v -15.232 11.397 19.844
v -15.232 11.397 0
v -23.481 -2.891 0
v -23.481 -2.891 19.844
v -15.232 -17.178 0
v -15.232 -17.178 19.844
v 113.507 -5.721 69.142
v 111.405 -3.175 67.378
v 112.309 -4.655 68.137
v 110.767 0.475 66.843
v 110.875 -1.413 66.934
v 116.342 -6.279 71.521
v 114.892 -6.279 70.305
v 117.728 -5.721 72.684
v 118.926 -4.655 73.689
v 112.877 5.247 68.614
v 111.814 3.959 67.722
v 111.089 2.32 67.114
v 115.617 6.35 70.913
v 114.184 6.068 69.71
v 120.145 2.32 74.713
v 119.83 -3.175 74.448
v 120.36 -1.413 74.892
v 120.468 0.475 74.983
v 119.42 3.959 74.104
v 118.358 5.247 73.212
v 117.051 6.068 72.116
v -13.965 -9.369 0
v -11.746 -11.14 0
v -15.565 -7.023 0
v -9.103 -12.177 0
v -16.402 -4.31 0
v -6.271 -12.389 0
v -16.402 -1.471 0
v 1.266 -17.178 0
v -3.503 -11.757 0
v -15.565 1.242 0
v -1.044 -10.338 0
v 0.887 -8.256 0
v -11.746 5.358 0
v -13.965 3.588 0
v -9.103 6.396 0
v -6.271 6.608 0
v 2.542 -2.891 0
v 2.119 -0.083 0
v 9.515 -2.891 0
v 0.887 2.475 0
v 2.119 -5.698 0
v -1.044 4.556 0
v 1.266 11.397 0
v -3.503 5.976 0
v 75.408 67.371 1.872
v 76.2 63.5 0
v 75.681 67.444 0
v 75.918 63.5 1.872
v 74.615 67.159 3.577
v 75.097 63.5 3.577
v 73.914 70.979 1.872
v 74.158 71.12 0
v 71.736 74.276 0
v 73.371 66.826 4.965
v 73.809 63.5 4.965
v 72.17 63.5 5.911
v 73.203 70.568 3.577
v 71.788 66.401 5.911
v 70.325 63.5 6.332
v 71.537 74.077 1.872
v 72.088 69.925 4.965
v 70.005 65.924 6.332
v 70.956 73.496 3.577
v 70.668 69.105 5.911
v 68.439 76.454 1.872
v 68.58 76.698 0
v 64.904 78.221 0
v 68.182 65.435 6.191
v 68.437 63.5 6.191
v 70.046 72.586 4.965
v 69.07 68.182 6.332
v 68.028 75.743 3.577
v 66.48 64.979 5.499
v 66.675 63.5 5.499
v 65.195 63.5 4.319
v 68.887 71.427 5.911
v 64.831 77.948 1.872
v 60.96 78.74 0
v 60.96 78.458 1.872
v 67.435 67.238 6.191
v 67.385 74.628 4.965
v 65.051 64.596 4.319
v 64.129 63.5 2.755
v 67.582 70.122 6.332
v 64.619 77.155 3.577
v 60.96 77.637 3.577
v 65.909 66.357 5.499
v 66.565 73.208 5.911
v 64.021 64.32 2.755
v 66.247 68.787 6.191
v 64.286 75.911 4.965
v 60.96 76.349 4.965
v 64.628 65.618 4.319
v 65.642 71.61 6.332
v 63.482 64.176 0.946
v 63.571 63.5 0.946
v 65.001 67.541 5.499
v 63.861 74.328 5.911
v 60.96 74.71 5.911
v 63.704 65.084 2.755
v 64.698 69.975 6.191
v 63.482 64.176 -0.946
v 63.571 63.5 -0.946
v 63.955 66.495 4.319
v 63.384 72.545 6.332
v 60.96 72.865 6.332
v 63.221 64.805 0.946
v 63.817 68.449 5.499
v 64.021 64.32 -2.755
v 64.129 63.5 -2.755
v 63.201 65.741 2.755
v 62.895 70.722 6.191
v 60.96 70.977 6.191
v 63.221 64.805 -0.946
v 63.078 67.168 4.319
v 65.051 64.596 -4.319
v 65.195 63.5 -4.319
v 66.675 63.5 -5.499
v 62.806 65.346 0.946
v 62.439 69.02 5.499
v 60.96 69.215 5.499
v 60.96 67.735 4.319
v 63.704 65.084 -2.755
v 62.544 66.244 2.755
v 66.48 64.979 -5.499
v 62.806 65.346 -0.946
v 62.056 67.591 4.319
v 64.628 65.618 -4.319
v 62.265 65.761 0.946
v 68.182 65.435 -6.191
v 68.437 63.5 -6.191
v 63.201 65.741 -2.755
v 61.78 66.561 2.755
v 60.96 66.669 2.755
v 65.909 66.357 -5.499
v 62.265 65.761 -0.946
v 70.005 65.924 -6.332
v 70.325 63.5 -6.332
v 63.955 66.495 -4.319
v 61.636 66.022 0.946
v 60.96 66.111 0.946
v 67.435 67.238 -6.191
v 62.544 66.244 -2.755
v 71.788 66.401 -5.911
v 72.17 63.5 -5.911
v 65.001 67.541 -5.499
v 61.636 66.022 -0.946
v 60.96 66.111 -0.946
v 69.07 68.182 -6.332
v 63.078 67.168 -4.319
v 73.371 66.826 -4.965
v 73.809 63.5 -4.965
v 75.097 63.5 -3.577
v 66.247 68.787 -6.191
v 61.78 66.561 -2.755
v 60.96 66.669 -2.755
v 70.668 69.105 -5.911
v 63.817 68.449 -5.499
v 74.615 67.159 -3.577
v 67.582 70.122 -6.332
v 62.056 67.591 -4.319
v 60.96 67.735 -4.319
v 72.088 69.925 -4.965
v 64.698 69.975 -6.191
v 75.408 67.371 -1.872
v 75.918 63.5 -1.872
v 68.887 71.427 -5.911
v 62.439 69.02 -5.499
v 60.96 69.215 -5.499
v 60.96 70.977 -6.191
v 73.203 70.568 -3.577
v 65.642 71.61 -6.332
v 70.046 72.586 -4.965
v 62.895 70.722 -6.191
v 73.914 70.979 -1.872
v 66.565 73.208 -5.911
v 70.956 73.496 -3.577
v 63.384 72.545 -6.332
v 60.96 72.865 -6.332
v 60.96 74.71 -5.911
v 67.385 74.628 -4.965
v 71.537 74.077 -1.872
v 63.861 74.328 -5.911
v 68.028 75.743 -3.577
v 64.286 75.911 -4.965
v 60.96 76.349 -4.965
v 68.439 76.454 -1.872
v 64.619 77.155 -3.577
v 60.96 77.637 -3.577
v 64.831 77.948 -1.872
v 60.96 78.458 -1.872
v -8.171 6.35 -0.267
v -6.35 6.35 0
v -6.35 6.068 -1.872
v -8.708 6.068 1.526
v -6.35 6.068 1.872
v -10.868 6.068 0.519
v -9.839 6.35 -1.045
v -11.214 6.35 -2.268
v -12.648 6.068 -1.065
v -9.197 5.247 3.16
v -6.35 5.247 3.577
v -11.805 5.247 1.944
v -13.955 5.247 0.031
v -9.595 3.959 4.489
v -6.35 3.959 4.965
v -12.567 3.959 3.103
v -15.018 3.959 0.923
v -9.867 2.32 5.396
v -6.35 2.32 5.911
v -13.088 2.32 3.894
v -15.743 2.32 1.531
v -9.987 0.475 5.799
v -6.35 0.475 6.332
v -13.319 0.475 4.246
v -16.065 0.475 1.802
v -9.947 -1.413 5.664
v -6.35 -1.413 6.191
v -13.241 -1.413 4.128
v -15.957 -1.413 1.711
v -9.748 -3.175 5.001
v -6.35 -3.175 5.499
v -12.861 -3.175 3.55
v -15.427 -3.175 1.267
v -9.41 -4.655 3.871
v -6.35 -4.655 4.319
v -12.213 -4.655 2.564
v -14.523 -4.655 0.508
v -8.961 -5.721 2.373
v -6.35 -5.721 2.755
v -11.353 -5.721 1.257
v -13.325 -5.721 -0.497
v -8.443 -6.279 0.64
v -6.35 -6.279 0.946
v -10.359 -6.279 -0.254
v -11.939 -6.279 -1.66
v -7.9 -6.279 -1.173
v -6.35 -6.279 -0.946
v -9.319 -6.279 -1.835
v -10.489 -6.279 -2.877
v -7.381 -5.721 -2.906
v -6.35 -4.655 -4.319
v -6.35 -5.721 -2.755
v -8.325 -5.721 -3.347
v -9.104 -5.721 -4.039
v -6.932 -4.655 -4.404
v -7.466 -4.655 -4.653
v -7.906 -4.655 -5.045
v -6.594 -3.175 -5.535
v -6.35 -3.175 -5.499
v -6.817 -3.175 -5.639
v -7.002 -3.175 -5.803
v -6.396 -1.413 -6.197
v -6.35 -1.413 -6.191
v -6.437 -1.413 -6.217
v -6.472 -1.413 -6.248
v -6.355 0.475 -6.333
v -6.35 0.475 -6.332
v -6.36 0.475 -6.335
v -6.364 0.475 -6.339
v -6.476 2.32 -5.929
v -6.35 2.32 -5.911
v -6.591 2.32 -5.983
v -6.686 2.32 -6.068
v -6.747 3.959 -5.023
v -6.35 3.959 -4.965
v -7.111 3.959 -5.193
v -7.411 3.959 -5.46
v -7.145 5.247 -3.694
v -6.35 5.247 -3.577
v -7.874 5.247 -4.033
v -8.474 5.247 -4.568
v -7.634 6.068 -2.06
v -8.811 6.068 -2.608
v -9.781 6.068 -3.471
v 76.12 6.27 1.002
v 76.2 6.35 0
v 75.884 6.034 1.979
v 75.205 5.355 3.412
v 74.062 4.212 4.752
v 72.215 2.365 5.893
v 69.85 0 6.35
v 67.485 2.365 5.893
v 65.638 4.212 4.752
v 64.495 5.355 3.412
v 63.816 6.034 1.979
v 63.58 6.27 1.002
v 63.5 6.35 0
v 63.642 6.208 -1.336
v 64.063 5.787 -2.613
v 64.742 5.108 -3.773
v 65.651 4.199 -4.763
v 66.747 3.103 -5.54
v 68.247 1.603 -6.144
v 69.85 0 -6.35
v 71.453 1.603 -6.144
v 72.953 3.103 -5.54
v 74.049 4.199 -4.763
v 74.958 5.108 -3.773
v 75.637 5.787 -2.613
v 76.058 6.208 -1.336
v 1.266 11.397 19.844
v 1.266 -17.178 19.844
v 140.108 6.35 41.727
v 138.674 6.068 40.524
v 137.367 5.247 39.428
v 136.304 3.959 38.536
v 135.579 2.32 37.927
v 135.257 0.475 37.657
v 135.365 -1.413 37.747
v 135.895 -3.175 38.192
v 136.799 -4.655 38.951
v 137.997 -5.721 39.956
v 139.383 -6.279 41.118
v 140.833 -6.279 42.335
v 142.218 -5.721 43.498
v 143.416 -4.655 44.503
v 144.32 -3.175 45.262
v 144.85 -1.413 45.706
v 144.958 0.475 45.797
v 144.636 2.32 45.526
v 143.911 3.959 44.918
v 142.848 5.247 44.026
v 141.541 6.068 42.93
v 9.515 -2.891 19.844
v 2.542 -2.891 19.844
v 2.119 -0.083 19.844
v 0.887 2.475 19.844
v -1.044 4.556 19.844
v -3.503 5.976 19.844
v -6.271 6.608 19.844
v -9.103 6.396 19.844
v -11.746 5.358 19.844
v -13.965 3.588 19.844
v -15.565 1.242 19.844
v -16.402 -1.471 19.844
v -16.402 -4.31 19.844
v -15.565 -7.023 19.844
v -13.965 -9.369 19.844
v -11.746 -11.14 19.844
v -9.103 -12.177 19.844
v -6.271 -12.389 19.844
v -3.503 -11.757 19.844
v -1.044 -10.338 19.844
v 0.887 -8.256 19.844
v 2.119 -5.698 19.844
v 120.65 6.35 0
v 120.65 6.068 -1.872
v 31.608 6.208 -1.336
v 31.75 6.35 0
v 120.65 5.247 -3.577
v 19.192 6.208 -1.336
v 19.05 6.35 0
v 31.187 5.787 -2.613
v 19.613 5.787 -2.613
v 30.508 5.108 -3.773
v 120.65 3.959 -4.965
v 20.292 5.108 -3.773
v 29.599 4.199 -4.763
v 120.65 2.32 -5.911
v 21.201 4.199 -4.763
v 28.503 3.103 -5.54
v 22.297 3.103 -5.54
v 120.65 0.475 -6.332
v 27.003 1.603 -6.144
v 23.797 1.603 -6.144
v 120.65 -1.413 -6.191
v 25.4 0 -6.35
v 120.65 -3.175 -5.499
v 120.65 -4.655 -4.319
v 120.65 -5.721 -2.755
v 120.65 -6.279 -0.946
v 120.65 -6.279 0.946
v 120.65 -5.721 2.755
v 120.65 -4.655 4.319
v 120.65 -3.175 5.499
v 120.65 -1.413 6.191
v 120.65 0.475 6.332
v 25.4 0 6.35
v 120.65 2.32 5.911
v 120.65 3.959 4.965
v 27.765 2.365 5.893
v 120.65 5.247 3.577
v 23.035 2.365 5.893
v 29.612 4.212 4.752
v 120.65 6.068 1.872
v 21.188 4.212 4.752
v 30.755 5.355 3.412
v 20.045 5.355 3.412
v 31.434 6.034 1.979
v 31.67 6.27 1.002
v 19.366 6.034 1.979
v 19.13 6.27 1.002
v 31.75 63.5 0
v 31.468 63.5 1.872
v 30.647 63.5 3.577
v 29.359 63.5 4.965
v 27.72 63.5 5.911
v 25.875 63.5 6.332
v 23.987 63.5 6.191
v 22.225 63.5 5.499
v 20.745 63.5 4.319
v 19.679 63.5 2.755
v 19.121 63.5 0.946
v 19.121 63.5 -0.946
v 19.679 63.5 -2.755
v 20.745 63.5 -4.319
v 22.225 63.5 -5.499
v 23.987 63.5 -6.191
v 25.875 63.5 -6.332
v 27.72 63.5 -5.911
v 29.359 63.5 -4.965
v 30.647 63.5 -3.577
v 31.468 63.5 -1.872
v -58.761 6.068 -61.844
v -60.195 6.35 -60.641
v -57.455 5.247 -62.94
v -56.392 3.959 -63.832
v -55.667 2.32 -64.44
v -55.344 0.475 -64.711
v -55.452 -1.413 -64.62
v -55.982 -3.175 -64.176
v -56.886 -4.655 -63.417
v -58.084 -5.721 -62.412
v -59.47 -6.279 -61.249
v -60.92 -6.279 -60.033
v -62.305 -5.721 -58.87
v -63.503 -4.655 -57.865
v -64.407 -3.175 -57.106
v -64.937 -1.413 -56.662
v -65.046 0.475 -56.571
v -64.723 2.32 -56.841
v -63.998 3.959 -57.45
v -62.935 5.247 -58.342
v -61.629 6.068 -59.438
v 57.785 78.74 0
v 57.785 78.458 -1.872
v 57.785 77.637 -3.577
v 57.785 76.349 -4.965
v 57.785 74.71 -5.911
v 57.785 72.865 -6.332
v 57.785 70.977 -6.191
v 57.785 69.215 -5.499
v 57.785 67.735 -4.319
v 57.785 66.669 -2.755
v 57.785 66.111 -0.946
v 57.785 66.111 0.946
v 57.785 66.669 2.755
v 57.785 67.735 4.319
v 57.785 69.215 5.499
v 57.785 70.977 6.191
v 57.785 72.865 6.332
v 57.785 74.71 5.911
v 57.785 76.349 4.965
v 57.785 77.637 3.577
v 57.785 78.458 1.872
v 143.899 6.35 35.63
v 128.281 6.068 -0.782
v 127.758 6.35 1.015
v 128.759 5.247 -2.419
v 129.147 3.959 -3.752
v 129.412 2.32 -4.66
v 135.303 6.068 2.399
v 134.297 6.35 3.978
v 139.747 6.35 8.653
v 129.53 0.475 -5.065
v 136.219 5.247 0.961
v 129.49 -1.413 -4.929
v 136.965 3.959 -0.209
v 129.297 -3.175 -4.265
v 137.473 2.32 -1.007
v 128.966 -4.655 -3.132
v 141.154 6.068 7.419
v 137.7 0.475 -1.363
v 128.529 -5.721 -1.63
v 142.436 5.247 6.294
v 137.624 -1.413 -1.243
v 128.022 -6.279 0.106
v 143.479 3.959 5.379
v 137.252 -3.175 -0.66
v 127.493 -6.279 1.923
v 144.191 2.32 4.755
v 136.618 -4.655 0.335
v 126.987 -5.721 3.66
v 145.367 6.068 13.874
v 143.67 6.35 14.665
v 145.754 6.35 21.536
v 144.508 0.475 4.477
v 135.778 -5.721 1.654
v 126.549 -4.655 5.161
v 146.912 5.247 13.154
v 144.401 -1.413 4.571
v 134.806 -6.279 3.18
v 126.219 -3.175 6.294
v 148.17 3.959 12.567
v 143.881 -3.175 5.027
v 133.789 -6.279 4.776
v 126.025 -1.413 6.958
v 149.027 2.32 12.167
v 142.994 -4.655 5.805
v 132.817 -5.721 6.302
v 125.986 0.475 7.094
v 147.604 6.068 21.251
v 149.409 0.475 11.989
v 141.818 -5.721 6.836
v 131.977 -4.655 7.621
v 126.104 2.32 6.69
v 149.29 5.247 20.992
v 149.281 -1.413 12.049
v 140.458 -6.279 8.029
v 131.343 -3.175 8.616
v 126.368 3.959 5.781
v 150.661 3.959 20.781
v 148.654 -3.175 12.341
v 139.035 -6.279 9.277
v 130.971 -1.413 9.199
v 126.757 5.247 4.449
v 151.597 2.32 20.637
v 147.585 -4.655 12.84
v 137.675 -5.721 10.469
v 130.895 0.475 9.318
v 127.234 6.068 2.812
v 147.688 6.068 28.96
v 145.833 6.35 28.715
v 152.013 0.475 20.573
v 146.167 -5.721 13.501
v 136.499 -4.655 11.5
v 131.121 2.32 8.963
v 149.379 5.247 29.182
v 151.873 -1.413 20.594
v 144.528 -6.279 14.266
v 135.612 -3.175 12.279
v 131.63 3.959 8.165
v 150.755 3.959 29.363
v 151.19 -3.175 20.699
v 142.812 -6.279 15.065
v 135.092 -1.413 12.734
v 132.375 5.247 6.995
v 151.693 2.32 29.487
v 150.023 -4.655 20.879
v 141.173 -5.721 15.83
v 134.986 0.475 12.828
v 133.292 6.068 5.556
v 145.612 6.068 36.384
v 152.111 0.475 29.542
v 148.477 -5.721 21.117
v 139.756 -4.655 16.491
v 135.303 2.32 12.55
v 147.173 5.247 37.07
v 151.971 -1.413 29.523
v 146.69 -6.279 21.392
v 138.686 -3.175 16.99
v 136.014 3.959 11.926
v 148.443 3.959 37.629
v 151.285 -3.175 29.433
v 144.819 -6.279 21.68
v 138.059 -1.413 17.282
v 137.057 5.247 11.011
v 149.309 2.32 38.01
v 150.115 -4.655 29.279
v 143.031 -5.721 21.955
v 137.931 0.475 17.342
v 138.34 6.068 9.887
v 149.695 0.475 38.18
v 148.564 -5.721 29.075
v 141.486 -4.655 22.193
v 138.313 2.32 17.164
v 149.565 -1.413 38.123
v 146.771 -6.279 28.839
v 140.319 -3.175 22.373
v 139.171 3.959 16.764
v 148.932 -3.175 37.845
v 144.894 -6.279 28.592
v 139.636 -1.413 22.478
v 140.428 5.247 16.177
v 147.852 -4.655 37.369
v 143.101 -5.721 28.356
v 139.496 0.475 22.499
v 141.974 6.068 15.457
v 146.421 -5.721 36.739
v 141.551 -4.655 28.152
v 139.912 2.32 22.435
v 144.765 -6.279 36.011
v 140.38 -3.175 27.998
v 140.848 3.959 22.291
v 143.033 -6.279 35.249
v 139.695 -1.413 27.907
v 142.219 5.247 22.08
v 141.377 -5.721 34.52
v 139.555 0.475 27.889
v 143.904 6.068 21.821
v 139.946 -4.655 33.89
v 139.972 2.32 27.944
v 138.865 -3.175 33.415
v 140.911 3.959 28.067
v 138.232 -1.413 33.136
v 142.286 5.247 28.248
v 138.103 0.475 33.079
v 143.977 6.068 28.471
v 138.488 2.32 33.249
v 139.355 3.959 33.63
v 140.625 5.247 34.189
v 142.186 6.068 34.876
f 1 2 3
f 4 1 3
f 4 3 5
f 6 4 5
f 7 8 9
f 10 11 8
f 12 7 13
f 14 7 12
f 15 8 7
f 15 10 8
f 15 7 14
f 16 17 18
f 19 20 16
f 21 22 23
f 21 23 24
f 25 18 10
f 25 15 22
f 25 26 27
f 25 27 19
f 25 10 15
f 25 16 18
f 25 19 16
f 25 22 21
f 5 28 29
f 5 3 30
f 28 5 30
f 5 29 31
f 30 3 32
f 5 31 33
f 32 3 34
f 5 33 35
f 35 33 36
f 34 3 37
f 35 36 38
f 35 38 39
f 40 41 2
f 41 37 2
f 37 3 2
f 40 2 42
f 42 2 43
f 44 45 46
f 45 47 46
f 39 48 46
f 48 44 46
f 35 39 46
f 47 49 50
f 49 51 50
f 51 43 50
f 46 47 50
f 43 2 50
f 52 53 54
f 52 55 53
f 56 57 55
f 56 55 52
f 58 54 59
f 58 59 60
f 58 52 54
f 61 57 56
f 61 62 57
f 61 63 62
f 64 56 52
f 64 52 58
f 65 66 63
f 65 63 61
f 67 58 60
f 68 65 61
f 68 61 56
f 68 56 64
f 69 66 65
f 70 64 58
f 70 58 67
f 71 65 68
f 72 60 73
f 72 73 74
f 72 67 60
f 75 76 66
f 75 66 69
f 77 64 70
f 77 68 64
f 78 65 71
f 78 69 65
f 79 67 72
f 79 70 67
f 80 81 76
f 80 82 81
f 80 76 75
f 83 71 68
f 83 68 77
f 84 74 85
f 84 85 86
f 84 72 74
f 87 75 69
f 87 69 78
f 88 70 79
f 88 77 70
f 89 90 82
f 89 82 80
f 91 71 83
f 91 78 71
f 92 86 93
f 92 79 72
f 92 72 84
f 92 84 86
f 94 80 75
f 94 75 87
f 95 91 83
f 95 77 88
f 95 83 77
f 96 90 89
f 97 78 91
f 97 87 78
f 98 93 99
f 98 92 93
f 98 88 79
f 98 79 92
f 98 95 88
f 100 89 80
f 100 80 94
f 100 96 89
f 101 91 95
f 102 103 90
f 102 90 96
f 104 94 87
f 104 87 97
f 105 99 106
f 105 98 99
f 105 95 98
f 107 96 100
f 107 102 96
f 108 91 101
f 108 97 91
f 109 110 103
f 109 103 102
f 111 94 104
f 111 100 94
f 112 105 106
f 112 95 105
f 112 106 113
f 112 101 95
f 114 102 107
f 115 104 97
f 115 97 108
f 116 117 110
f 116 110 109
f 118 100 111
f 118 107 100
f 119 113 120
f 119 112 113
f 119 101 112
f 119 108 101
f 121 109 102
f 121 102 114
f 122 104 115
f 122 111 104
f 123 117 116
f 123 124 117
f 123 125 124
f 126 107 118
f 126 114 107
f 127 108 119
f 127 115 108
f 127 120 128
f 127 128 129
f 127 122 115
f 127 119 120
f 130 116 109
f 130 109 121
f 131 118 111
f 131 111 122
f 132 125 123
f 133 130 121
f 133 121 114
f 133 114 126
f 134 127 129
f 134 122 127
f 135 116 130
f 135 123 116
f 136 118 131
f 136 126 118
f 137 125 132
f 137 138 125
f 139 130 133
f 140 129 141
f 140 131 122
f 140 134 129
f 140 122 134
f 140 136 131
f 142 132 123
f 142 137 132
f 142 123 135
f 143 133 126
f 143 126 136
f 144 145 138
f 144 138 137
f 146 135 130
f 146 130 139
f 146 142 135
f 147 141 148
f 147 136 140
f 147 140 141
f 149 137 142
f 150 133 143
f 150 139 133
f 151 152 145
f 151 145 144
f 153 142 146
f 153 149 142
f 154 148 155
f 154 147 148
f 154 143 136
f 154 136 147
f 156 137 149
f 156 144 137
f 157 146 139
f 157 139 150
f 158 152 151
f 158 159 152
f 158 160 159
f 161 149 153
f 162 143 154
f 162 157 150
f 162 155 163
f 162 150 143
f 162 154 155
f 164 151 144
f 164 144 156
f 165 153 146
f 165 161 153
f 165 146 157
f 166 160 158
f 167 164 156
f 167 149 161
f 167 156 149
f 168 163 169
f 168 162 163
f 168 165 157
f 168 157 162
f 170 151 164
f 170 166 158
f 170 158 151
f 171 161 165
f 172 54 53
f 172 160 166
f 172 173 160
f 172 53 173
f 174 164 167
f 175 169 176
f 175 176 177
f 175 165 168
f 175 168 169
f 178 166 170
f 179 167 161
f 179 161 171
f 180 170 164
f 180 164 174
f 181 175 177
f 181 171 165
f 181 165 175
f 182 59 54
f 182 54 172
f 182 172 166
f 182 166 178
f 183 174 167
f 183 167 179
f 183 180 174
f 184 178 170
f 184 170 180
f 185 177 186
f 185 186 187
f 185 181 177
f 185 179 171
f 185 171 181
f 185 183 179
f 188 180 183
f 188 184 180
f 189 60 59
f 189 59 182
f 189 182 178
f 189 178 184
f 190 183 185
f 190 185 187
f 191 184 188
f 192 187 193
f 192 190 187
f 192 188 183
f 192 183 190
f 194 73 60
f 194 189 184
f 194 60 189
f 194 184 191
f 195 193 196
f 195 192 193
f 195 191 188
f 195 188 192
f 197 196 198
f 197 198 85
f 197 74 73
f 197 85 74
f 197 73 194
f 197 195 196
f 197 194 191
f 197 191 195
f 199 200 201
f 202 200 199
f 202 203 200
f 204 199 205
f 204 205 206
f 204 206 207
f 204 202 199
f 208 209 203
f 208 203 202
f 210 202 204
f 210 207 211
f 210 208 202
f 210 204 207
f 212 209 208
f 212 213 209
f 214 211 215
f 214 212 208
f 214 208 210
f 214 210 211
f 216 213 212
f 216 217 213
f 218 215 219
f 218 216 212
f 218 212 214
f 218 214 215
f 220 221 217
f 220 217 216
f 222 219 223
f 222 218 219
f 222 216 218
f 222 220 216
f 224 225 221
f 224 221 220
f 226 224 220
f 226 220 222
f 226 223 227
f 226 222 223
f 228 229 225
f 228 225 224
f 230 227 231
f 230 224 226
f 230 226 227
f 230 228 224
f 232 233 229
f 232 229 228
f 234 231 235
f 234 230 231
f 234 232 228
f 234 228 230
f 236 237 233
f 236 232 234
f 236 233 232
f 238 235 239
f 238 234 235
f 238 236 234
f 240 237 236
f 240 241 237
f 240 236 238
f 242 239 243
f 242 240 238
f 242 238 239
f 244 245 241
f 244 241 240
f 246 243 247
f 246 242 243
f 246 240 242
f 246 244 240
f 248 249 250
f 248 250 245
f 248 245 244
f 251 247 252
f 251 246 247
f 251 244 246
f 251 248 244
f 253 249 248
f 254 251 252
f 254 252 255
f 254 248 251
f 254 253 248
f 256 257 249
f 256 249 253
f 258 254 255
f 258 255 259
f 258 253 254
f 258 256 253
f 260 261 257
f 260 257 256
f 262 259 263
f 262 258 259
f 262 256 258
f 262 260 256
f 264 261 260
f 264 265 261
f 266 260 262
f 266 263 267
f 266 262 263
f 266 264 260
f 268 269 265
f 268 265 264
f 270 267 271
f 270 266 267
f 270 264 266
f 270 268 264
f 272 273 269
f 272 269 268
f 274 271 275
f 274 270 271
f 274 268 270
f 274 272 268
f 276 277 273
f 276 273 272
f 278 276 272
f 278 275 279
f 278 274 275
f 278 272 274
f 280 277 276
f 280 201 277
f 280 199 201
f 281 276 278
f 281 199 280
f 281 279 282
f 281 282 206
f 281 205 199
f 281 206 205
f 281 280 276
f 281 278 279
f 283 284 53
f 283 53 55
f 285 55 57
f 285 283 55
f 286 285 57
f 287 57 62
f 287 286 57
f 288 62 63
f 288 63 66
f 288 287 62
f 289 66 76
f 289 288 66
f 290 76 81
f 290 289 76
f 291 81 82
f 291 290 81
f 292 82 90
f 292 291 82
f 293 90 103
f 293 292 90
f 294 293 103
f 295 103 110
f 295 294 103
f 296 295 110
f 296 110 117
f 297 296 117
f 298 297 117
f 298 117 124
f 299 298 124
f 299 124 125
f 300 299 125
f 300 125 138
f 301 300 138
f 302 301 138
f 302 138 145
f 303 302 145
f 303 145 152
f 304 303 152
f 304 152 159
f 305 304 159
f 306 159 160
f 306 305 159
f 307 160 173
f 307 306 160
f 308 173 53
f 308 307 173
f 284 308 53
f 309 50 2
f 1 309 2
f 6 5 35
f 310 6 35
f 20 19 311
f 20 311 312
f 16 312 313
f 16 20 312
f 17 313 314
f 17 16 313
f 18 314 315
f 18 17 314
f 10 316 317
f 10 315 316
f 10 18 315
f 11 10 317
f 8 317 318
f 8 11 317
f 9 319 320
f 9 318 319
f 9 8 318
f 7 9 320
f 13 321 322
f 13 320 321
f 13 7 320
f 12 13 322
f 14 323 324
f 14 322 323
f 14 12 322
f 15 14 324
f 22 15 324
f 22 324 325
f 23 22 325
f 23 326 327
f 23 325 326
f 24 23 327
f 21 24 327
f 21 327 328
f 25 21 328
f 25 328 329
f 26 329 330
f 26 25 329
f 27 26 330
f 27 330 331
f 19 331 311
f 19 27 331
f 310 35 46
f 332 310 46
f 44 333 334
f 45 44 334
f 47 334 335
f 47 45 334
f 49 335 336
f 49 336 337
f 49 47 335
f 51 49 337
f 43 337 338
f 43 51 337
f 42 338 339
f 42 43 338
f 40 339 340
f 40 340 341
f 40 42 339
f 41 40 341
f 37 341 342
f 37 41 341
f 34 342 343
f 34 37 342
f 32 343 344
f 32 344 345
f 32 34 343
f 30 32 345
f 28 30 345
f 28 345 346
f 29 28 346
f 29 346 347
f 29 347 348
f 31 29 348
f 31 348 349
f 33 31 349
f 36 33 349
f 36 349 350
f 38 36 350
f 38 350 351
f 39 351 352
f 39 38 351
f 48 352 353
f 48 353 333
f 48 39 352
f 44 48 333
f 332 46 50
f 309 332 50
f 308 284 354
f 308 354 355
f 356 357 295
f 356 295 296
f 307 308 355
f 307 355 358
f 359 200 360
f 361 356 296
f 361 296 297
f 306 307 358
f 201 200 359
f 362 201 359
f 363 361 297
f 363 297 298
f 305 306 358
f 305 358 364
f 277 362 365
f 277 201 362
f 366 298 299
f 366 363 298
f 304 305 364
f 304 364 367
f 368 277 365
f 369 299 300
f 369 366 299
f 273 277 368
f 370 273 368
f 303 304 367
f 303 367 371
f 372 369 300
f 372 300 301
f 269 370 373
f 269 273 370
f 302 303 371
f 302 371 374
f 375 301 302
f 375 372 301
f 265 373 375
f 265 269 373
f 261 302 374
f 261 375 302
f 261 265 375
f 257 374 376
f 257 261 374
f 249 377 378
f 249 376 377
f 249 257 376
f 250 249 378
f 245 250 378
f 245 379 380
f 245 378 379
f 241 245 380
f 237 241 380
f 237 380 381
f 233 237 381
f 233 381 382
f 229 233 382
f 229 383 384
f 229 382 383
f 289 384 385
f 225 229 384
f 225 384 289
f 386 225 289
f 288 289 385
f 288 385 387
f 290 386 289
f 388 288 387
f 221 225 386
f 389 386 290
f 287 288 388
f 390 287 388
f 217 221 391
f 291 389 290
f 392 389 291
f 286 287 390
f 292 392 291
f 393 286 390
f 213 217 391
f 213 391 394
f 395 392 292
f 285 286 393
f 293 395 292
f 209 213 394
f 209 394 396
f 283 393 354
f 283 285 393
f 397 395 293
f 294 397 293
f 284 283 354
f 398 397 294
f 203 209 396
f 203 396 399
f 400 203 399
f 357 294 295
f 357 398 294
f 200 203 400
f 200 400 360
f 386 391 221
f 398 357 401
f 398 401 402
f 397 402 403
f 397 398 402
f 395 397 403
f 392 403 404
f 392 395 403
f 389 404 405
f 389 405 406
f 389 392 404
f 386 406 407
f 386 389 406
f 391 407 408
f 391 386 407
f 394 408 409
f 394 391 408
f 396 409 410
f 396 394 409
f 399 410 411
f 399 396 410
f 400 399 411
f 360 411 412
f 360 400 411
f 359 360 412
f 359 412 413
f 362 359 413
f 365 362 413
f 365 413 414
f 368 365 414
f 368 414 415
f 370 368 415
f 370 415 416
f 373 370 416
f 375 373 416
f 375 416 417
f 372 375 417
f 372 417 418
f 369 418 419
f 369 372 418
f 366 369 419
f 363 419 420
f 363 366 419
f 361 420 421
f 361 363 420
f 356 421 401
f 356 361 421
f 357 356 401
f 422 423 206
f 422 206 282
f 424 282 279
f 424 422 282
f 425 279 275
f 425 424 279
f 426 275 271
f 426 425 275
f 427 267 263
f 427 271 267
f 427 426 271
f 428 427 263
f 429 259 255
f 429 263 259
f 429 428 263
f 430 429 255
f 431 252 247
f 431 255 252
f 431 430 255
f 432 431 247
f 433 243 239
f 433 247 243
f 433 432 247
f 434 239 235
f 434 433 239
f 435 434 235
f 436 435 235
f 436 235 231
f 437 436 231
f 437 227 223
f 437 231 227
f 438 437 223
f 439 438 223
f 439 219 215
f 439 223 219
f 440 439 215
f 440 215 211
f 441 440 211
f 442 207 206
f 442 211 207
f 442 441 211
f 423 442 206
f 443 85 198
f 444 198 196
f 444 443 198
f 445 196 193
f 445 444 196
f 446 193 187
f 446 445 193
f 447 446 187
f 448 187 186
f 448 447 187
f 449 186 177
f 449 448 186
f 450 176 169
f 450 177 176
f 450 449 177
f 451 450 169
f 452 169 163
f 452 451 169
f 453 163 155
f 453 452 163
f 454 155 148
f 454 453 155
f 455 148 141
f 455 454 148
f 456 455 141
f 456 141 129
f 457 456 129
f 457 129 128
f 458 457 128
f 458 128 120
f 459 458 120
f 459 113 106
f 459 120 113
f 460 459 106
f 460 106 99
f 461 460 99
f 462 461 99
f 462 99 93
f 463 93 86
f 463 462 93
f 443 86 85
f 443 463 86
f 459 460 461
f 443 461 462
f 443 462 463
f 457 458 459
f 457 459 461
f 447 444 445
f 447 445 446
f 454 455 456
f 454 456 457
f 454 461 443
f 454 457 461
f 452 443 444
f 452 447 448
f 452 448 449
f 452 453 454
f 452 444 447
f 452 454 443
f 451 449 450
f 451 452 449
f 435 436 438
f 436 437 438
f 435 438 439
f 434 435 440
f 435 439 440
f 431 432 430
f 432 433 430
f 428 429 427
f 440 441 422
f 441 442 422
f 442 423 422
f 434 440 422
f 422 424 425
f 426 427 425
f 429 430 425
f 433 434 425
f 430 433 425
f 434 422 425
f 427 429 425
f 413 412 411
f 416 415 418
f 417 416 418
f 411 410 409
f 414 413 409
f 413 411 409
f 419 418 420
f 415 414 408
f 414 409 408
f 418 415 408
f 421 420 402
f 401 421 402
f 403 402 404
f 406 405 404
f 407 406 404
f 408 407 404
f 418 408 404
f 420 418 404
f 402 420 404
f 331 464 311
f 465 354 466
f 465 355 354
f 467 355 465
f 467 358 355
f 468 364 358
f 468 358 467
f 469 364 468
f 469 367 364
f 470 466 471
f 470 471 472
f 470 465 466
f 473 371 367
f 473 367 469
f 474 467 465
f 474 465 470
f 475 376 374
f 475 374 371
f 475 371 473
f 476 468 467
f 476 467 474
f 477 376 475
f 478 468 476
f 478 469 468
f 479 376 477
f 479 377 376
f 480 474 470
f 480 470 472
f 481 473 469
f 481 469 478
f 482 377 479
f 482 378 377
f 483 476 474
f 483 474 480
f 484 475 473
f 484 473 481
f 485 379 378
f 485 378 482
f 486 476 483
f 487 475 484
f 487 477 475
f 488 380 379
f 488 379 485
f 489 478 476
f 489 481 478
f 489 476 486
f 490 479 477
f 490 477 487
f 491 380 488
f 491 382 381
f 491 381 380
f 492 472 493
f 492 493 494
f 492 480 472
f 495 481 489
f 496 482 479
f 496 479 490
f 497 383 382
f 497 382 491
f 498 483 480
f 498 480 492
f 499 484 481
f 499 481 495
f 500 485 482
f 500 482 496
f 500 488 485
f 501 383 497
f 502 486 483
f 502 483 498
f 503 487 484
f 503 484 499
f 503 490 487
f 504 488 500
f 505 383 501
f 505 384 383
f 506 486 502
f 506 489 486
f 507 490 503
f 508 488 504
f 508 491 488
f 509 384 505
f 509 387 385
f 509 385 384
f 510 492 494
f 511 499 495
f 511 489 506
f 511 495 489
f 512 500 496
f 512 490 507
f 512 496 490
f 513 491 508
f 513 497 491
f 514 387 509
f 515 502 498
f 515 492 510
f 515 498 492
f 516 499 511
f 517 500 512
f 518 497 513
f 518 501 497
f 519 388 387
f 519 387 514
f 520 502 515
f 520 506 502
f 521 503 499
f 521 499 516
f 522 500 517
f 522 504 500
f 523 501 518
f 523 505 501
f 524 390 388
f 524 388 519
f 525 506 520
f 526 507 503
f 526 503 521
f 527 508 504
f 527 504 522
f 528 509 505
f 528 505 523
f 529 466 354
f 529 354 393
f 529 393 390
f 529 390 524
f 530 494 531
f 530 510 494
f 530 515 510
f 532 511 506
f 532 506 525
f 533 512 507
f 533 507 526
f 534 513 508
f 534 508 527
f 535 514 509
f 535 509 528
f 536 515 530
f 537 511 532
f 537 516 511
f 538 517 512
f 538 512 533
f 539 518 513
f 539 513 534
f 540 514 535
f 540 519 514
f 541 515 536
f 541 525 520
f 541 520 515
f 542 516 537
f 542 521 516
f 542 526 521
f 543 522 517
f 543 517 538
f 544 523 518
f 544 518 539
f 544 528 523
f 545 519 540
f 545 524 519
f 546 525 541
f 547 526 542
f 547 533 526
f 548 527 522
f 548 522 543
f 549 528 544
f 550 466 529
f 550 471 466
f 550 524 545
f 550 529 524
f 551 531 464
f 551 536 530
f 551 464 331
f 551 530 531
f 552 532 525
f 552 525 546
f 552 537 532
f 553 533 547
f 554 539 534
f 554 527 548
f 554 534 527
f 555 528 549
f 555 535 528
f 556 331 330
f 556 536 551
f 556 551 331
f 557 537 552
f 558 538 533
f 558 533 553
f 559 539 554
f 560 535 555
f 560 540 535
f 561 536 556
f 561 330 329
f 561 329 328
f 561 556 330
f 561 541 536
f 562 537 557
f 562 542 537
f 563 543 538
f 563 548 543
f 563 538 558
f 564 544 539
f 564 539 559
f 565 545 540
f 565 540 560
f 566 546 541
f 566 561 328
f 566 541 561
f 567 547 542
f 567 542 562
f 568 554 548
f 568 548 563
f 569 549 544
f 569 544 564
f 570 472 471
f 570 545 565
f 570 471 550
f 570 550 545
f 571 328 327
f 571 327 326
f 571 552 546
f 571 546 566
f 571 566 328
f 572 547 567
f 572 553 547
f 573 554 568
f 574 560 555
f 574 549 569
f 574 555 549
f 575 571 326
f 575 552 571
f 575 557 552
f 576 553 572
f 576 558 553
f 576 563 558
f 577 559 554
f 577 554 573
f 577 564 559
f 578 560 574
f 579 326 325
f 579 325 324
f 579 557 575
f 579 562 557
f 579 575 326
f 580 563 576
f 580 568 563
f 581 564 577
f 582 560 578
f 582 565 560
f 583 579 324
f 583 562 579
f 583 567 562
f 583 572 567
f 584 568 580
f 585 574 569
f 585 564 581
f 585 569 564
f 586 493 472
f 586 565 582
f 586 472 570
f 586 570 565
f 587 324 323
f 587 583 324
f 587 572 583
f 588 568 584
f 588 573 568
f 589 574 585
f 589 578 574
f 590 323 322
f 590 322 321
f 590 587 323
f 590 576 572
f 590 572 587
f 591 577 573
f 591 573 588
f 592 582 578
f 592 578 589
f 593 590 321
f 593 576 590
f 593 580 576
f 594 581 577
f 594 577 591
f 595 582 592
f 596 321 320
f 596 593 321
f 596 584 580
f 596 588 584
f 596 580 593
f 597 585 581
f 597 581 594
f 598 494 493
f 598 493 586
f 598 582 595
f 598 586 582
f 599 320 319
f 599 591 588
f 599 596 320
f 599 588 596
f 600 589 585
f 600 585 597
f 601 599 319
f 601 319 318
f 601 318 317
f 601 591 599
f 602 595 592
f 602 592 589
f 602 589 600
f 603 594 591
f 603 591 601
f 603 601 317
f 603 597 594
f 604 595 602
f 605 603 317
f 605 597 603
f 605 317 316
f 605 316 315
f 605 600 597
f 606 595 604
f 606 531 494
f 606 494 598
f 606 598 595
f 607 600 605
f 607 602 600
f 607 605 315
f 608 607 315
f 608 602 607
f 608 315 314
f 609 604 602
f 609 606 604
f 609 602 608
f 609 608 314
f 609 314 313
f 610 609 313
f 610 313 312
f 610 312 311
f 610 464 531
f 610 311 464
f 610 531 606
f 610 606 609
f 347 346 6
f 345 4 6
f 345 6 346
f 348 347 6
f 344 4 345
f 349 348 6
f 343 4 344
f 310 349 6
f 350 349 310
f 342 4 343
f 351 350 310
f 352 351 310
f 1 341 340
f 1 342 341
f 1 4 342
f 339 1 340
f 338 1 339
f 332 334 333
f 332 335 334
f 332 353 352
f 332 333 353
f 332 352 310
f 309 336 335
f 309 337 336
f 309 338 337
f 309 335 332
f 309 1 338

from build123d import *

# Parameters (mm, degrees)
F1_R      = 6.35
F4_R      = 6.35
F5_DEPTH  = 63.5
F5_FACE_R = 6.35
F8_R      = 9.525
F9_DEPTH  = 19.84375


with BuildPart() as f2:
    # F2: sweep along a path in F0
    with BuildLine(Plane.XZ) as f2_path:
        Line((0, 0), (120.65, 0))
        ThreePointArc((120.65, 0), (143.6702177907, 14.6654961518), (140.1075288552, 41.726805286))
        Line((140.1075288552, 41.726805286), (115.6173209262, 70.9130985689))
    # F1 (on Right) → F2 (sweep)
    with BuildSketch(Plane.YZ):
        Circle(F1_R)
    sweep(path=f2_path.line)

    # F3: sweep along a path in F0
    with BuildLine(Plane.XZ) as f3_path:
        Line((0, 0), (-6.35, 0))
        ThreePointArc((-6.35, 0), (-9.0336259621, -0.5949455523), (-11.2143822138, -2.2682986785))
        Line((-11.2143822138, -2.2682986785), (-60.1947980719, -60.6408852442))
    # F1 (on Right) → F3 (sweep)
    with BuildSketch(Plane.YZ):
        Circle(F1_R)
    sweep(path=f3_path.line)

    # F4 (on Front) → F5 (join)
    with BuildSketch(Plane.XZ):
        with Locations((25.4, 0)):
            Circle(F4_R)
        with Locations((69.85, 0)):
            Circle(F4_R)
    extrude(amount=-F5_DEPTH)

    # F7: sweep along a path in F6
    with BuildLine(Plane.XY) as f7_path:
        ThreePointArc((69.85, 63.5), (67.2461792847, 69.7861792847), (60.96, 72.39))
        Line((60.96, 72.39), (57.785, 72.39))
    # F5_face (on face) → F7 (sweep)
    with BuildSketch(Plane(origin=(69.85, 63.5, 0), x_dir=(1, 0, 0), z_dir=(0, 1, 0))):
        Circle(F5_FACE_R)
    sweep(path=f7_path.line)


with BuildPart() as f9:
    # F8 (on Top) → F9 (new body)
    with BuildSketch(Plane.XY):
        Polygon((9.5146208037, -2.8906361649), (1.2657288326, 11.3968638351), (-15.2320551094, 11.3968638351), (-23.4809470805, -2.8906361649), (-15.2320551094, -17.1781361649), (1.2657288326, -17.1781361649), align=None)
        with Locations((-6.9831631384, -2.8906361649)):
            Circle(F8_R, mode=Mode.SUBTRACT)
    extrude(amount=F9_DEPTH)


solid = Compound([f2.part, f9.part])
